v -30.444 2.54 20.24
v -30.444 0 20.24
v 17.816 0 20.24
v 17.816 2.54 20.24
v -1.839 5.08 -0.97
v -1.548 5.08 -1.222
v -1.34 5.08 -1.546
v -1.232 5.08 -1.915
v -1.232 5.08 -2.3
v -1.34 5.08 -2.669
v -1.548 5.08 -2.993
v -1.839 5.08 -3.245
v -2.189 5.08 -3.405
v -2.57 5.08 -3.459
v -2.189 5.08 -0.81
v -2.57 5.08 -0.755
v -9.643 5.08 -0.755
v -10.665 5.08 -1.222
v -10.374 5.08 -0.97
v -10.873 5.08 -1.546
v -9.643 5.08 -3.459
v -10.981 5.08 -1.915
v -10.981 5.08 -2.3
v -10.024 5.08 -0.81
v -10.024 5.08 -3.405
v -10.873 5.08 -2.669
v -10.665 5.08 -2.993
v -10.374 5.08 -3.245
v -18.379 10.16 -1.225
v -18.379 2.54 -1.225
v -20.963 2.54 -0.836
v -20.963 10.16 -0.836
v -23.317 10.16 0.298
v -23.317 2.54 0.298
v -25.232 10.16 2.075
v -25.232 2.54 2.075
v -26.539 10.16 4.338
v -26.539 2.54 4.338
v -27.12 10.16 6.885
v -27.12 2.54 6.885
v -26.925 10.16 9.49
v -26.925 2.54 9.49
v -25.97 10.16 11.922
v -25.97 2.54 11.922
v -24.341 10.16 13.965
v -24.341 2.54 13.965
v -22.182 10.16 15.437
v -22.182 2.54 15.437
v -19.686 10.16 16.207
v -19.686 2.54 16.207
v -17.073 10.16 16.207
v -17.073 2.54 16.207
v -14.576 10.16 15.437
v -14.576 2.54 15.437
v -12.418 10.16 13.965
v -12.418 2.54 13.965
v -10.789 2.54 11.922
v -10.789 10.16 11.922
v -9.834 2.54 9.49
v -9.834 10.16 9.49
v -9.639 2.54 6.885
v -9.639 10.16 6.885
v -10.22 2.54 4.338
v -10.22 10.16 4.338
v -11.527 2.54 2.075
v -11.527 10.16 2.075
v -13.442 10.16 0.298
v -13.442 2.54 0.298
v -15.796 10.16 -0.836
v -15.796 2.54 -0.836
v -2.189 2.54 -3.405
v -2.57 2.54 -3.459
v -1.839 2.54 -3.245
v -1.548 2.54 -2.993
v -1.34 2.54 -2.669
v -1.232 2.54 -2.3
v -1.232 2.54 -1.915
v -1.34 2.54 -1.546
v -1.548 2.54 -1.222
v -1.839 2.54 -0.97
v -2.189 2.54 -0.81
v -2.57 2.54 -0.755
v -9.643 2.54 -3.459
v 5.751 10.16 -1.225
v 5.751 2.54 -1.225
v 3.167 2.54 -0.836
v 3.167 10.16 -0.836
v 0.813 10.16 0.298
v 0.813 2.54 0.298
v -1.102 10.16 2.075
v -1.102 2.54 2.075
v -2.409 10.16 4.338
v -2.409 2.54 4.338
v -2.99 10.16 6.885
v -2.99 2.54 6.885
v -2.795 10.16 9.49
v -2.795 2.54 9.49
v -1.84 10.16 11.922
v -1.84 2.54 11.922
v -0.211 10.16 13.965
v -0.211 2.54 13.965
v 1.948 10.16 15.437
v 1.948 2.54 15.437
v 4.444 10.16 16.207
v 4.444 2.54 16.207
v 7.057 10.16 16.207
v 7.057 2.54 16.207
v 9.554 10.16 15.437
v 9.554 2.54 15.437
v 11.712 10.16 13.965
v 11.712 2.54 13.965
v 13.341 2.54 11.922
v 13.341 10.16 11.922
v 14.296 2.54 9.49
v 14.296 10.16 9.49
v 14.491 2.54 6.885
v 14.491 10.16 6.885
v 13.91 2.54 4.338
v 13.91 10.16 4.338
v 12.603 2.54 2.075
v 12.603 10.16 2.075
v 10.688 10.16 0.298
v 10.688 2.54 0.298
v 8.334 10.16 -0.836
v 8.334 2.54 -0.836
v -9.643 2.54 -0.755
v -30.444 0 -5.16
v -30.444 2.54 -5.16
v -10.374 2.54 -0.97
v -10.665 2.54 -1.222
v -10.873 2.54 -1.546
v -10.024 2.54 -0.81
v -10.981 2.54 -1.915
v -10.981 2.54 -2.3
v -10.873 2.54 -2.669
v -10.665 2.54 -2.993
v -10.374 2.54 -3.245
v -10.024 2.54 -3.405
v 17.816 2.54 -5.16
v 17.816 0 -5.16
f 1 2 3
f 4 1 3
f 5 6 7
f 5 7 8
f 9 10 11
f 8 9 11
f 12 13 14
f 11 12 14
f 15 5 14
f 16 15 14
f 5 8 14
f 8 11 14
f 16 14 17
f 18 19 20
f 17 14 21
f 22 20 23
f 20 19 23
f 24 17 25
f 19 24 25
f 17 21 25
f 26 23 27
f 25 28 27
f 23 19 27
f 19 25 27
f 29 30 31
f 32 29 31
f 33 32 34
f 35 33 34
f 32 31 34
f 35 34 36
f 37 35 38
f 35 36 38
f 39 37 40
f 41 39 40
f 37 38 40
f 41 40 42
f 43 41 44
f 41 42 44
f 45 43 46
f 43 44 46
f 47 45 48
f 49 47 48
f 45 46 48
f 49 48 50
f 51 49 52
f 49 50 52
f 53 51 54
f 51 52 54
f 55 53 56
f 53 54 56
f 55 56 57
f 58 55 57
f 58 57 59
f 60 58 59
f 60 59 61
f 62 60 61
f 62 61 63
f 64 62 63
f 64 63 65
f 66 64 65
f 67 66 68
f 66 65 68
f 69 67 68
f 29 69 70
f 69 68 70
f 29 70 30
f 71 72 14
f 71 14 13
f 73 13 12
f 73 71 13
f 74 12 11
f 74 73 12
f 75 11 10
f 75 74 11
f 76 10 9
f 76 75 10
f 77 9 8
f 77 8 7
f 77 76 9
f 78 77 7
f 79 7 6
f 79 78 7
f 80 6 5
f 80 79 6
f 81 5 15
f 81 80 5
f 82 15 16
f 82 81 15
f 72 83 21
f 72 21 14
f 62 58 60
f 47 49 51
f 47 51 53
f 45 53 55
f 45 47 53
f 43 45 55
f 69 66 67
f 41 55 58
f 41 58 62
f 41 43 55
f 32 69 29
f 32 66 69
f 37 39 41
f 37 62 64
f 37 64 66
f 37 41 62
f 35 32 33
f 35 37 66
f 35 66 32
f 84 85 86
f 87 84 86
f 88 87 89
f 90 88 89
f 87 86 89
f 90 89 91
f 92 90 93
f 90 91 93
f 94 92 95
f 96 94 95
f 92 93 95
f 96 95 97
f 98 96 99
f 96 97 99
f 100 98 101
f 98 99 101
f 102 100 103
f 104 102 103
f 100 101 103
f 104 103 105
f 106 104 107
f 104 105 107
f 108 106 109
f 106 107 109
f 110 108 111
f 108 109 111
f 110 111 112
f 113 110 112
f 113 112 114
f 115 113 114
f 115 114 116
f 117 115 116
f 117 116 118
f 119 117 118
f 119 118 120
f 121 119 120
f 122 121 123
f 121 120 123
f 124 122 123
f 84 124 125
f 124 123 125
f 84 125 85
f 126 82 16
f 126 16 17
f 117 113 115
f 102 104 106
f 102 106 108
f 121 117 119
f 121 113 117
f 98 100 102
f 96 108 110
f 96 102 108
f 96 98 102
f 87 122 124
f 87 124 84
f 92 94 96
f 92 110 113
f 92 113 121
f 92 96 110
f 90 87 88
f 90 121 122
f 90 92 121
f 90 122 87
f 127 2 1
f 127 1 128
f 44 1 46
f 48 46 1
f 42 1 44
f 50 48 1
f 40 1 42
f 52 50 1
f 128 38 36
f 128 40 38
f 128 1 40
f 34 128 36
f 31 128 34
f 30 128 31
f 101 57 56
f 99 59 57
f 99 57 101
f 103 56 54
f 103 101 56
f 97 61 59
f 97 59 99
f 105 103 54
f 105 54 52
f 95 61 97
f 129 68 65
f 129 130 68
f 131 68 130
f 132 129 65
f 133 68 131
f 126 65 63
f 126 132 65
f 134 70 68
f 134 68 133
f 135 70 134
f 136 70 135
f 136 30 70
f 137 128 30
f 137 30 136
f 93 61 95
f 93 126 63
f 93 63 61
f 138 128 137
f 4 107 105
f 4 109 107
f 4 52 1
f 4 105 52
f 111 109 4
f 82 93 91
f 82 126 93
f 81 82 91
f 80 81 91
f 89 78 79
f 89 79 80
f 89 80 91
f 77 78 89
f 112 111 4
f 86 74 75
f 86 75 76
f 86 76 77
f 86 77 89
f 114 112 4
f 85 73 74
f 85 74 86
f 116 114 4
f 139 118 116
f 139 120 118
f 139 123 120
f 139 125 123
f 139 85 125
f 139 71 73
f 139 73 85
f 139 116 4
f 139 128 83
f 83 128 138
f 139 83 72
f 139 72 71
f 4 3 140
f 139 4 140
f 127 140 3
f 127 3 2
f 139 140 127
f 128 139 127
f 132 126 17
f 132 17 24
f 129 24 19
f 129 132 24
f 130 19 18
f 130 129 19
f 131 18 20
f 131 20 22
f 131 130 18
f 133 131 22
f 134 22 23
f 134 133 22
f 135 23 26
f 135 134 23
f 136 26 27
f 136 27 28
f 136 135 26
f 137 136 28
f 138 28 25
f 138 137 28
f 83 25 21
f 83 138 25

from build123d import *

# Parameters (mm, degrees)
SKETCH1_W           = 24.13
SKETCH1_H           = 25.4
SKETCH1_R           = 9.145310151
BOSS_EXTRUDE1_DEPTH = 2.54
SKETCH4_R           = 8.765161433
BOSS_EXTRUDE2_DEPTH = 7.62
BOSS_EXTRUDE3_START = -2.54
BOSS_EXTRUDE3_DEPTH = 5.08


with BuildPart() as part:
    # Sketch1 → Boss-Extrude1 (new body)
    with BuildSketch(Plane(origin=(0, 0, 0), x_dir=(1, 0, 0), z_dir=(0, 1, 0))):
        with Locations((-18.379392523, -7.539883178)):
            Rectangle(SKETCH1_W, SKETCH1_H)
        with Locations((-18.379392523, -7.539883178)):
            Circle(SKETCH1_R, mode=Mode.SUBTRACT)
        with Locations((5.750607477, -7.539883178)):
            Rectangle(SKETCH1_W, SKETCH1_H)
        with Locations((5.750607477, -7.539883178)):
            Circle(SKETCH1_R, mode=Mode.SUBTRACT)
        with Locations((5.750607477, -7.539883178)):
            Circle(SKETCH1_R)
        with Locations((-18.379392523, -7.539883178)):
            Circle(SKETCH1_R)
    extrude(amount=BOSS_EXTRUDE1_DEPTH)

    # Sketch4 → Boss-Extrude2 (add)
    with BuildSketch(Plane(origin=(0, 2.54, 0), x_dir=(1, 0, 0), z_dir=(0, 1, 0))):
        with Locations(Location((5.750607477, -7.539883178, 0), (0, 0, 90))):
            Circle(SKETCH4_R)
        with Locations(Location((-18.379392523, -7.539883178, 0), (0, 0, 90))):
            Circle(SKETCH4_R)
    extrude(amount=BOSS_EXTRUDE2_DEPTH)

    # Sketch5 → Boss-Extrude3 (add)
    with BuildSketch(Plane(origin=(0, 2.54, 0), x_dir=(1, 0, 0), z_dir=(0, 1, 0)).offset(BOSS_EXTRUDE3_START)):
        with BuildLine():
            Line((-9.642774863, 3.459380336), (-2.569962391, 3.459380336))
            ThreePointArc((-2.569962391, 3.459380336), (-1.217807066, 2.10722501), (-2.569962391, 0.755069685))
            Line((-2.569962391, 0.755069685), (-9.642774863, 0.755069685))
            ThreePointArc((-9.642774863, 0.755069685), (-10.994930189, 2.10722501), (-9.642774863, 3.459380336))
        make_face()
    extrude(amount=BOSS_EXTRUDE3_DEPTH)


solid = part.part
